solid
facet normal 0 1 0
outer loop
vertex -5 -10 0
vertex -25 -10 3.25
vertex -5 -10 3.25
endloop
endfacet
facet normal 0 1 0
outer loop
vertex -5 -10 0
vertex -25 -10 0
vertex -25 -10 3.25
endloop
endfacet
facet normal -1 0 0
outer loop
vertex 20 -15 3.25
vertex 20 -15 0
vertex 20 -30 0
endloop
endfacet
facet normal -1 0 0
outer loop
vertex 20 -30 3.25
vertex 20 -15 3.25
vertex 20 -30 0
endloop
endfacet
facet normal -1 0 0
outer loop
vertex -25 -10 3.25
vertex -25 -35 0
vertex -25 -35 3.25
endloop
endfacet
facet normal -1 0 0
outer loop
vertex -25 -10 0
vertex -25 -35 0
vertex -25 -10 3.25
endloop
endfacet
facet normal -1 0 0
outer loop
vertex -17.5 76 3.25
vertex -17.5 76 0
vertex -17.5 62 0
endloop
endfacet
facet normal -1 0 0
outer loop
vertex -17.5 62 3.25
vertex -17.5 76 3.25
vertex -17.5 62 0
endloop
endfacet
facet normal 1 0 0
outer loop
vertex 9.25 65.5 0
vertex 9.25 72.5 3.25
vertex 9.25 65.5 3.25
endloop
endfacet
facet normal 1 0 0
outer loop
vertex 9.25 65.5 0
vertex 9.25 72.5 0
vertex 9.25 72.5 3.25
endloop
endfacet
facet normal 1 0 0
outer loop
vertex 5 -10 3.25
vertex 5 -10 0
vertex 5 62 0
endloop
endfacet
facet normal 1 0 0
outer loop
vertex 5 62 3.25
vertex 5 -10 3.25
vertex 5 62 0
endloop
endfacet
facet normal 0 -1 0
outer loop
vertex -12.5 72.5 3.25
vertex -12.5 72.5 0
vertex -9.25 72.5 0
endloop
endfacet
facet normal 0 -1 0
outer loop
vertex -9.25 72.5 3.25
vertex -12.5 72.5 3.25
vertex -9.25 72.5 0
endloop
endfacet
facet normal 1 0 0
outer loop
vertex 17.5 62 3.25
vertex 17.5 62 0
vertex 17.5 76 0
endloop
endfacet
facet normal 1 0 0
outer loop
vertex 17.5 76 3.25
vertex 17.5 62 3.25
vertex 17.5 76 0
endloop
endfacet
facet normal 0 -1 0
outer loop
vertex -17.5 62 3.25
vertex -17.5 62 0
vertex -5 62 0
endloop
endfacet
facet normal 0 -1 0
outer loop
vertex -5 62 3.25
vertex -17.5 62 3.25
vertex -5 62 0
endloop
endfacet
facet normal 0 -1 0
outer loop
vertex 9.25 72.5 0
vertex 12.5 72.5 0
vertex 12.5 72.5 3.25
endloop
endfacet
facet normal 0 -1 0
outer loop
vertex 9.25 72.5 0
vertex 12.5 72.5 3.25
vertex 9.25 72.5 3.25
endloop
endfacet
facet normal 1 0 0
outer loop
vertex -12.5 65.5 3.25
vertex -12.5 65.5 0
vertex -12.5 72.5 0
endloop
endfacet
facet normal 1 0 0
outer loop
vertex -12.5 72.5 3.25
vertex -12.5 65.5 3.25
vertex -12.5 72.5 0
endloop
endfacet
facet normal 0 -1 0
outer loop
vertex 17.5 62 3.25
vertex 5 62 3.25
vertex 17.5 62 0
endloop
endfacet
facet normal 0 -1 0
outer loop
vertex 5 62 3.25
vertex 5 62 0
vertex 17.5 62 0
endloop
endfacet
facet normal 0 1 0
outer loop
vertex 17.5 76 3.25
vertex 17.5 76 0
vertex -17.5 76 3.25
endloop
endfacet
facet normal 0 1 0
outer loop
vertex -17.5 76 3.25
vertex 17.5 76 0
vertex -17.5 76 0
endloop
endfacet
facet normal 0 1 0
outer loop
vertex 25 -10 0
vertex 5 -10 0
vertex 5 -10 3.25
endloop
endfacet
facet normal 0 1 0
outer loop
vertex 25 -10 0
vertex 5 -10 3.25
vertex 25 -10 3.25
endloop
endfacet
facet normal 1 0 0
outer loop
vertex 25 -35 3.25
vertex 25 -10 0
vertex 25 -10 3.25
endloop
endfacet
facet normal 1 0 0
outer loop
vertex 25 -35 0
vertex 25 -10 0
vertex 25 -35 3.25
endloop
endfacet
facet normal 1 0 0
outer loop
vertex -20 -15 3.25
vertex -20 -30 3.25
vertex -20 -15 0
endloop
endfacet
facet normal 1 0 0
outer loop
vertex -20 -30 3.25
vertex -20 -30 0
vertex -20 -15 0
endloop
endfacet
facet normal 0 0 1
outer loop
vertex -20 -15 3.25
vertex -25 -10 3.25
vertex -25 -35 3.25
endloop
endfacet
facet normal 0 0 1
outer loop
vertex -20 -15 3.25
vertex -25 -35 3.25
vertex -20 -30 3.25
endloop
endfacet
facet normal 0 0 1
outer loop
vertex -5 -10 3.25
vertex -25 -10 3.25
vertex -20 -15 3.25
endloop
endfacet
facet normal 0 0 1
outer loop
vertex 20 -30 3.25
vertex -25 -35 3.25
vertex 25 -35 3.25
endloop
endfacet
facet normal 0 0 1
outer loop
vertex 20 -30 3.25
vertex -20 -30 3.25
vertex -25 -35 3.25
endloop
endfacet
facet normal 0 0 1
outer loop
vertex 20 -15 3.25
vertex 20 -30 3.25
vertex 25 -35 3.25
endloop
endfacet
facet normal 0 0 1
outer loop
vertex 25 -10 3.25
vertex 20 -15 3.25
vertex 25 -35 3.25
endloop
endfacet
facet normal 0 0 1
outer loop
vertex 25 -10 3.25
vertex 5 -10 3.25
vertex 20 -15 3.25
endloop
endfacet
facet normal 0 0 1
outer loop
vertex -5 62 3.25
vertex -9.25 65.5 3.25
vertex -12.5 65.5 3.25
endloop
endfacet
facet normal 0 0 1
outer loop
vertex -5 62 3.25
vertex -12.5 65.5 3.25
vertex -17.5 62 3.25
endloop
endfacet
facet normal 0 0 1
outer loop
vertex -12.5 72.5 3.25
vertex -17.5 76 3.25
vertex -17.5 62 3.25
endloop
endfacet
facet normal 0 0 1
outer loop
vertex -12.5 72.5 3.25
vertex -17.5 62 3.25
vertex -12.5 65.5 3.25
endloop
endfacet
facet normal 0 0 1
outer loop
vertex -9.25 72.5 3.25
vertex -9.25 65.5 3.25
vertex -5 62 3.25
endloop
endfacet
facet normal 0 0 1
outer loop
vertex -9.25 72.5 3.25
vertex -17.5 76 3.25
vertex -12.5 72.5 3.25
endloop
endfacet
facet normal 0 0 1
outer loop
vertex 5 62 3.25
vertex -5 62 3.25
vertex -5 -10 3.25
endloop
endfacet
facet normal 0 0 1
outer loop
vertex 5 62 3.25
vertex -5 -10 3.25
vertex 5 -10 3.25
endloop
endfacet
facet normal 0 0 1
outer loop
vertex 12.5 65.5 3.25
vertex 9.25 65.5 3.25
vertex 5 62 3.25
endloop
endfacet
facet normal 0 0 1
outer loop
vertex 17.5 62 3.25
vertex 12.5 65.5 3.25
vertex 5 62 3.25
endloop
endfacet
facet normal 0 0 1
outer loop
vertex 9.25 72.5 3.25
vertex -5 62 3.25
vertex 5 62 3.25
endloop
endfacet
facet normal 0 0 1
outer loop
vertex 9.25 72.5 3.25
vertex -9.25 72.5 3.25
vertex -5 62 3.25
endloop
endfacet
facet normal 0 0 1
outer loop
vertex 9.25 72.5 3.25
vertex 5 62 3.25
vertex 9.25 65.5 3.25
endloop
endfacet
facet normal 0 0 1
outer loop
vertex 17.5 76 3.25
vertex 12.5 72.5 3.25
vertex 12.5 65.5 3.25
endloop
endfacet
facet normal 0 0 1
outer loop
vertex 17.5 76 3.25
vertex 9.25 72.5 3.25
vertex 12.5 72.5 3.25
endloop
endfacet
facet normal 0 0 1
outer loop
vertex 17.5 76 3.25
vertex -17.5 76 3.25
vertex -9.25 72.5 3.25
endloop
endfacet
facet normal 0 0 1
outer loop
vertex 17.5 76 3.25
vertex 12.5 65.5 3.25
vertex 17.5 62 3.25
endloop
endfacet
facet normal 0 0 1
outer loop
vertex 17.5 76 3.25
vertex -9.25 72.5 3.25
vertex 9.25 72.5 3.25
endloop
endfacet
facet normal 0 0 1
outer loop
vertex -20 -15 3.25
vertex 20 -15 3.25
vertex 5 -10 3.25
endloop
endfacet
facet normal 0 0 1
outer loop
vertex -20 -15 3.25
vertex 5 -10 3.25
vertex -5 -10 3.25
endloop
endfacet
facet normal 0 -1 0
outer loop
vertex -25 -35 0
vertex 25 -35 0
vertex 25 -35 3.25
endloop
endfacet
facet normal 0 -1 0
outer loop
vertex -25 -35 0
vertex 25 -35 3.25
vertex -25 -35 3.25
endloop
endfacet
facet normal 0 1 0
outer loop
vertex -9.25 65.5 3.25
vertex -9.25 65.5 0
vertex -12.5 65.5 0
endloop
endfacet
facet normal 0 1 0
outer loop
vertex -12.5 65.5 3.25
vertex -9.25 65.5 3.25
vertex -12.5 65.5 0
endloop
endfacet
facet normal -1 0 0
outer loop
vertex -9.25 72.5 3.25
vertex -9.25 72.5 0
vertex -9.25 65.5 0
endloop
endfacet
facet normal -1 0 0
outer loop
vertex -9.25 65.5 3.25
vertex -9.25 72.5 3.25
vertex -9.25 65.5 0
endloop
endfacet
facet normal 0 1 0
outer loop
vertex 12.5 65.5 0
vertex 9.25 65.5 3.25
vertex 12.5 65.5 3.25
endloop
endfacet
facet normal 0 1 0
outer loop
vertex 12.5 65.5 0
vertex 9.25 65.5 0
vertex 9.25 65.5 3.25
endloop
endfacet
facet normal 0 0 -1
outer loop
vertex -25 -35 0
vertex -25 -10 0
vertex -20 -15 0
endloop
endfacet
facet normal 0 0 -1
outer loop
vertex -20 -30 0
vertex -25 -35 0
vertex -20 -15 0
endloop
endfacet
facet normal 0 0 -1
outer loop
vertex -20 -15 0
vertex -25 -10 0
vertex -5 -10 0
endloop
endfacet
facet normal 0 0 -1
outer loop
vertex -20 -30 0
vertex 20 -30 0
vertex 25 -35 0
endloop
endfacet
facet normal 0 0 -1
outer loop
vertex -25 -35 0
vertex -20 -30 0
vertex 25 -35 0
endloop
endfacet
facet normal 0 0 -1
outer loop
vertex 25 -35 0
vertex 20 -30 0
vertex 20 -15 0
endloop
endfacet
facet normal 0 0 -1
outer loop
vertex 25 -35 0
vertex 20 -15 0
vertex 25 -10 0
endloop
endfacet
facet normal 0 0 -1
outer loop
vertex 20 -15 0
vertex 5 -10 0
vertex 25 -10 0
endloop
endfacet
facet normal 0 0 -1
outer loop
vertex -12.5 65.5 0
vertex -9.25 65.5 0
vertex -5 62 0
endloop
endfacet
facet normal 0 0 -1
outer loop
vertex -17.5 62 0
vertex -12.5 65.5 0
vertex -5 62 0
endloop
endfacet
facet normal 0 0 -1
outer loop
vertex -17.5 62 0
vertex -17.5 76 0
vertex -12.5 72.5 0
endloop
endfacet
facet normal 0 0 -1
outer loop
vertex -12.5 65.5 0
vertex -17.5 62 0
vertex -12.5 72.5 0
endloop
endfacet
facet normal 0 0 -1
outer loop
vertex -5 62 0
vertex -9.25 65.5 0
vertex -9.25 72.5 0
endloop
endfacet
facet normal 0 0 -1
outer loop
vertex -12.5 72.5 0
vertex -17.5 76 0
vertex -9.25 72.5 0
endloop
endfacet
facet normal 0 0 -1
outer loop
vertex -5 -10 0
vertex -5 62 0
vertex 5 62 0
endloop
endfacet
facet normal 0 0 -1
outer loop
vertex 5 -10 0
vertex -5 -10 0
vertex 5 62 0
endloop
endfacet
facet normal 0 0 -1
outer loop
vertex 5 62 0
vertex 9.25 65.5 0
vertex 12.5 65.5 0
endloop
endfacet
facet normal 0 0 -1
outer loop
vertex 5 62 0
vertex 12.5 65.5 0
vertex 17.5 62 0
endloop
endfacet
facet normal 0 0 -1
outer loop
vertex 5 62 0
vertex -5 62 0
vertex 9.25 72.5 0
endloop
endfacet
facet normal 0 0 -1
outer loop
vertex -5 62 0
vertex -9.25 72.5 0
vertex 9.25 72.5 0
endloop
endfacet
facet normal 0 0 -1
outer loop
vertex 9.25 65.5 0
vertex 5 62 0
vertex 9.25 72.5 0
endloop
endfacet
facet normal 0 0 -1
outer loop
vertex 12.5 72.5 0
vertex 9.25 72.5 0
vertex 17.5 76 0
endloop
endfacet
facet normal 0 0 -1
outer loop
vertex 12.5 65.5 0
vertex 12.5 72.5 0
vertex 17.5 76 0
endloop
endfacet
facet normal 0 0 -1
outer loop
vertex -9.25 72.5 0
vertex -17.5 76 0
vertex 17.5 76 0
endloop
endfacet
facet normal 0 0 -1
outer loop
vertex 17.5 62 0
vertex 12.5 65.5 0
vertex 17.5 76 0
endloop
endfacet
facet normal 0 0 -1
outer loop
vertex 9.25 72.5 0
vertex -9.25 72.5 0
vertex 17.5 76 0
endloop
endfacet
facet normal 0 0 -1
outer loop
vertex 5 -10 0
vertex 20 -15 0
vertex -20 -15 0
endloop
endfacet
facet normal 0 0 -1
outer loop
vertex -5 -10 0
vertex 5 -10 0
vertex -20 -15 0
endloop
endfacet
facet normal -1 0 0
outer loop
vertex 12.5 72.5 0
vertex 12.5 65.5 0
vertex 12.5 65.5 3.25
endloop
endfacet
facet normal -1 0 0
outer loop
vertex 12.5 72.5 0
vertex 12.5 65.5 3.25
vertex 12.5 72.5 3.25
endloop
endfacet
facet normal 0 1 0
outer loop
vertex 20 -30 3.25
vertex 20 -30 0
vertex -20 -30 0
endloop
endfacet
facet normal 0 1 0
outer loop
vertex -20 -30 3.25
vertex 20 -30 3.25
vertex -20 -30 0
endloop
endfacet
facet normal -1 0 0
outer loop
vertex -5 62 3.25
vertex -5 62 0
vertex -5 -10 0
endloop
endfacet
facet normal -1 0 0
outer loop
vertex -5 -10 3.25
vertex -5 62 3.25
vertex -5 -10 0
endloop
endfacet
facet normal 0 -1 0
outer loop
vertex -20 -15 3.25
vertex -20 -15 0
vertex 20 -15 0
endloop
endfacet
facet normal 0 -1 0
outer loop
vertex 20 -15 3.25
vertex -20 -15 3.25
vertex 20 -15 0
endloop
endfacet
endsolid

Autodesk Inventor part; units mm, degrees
ref_plane "YZ Plane" through (0, 0, 0) normal (1, 0, 0) x (0, 1, 0)
ref_plane "XZ Plane" through (0, 0, 0) normal (0, 1, 0) x (-1, 0, 0)
ref_plane "XY Plane" through (0, 0, 0) normal (0, 0, 1) x (1, 0, 0)
sketch "Sketch1" plane through (0, 0, 0) normal (0, 0, 1) x (1, 0, 0)
  line L0 (-50, 50) -> (50, 50)
  line L1 (50, 50) -> (50, -50)
  line L2 (50, -50) -> (-50, -50)
  line L3 (-50, -50) -> (-50, 50)
  line L4 (-92.7646, -8.503) -> (-89.7646, -8.503)
  line L5 (-89.7646, -8.503) -> (-89.7646, -11.753)
  line L6 (-89.7646, -11.753) -> (-92.7646, -11.753)
  line L7 (-92.7646, -11.753) -> (-92.7646, -8.503)
  line L8 (-92.7646, -21.6527) -> (-89.7646, -21.6527)
  line L9 (-89.7646, -21.6527) -> (-89.7646, -21.7527)
  line L10 (-89.7646, -21.7527) -> (-92.7646, -21.7527)
  line L11 (-92.7646, -21.7527) -> (-92.7646, -21.6527)
  line L12 (-50, 50) -> (-46.75, 50)
  line L13 (-46.75, 50) -> (-46.75, 36)
  line L14 (-46.75, 36) -> (-50, 36)
  line L15 (-50, 36) -> (-50, 50)
  line L16 (0, 50) -> (0, -50) construction
  line L17 (-50, 0) -> (50, 0) construction
  line L18 (50, 50) -> (46.75, 50)
  line L19 (46.75, 50) -> (46.75, 36)
  line L20 (46.75, 36) -> (50, 36)
  line L21 (50, 36) -> (50, 50)
  line L22 (-50, -50) -> (-46.75, -50)
  line L23 (-46.75, -50) -> (-46.75, -36)
  line L24 (-46.75, -36) -> (-50, -36)
  line L25 (-50, -36) -> (-50, -50)
  line L26 (46.75, -50) -> (46.75, -36)
  line L27 (46.75, -36) -> (50, -36)
  line L28 (50, -36) -> (50, -50)
  line L29 (50, -50) -> (46.75, -50)
  line L30 (-40, 40) -> (-10, 40)
  line L31 (-10, 40) -> (-10, 0)
  line L32 (-10, 0) -> (-40, 0)
  line L33 (-40, 0) -> (-40, 40)
  line L34 (40, 40) -> (10, 40)
  line L35 (10, 40) -> (10, 0)
  line L36 (10, 0) -> (40, 0)
  line L37 (40, 0) -> (40, 40)
  line L38 (-10, 50) -> (-6.75, 50)
  line L39 (-6.75, 50) -> (-6.75, 42)
  line L40 (-6.75, 42) -> (-10, 42)
  line L41 (-10, 42) -> (-10, 50)
  line L42 (10, 50) -> (6.75, 50)
  line L43 (6.75, 50) -> (6.75, 42)
  line L44 (6.75, 42) -> (10, 42)
  line L45 (10, 42) -> (10, 50)
  line L46 (-25, 0) -> (-25, 40) construction
  line L47 (-40, 50) -> (-43.25, 50)
  line L48 (-43.25, 50) -> (-43.25, 42)
  line L49 (-43.25, 42) -> (-40, 42)
  line L50 (-40, 42) -> (-40, 50)
  line L51 (43.25, 42) -> (40, 42)
  line L52 (43.25, 50) -> (43.25, 42)
  line L53 (40, 50) -> (43.25, 50)
  line L54 (40, 42) -> (40, 50)
  line L55 (-20, -15) -> (20, -15)
  line L56 (20, -15) -> (20, -30)
  line L57 (20, -30) -> (-20, -30)
  line L58 (-20, -30) -> (-20, -15)
  line L59 (-25, -10) -> (25, -10)
  line L60 (25, -10) -> (25, -35)
  line L61 (25, -35) -> (-25, -35)
  line L62 (-25, -35) -> (-25, -10)
  line L63 (0, -15) -> (0, -30) construction
  line L64 (-5, -10) -> (5, -10)
  line L65 (5, -10) -> (5, 62)
  line L66 (5, 62) -> (-5, 62)
  line L67 (-5, 62) -> (-5, -10)
  line L68 (0, 62) -> (0, -10) construction
  line L69 (-17.5, 62) -> (17.5, 62)
  line L70 (17.5, 62) -> (17.5, 76)
  line L71 (17.5, 76) -> (-17.5, 76)
  line L72 (-17.5, 76) -> (-17.5, 62)
  line L73 (0, 76) -> (0, 62) construction
  line L74 (-20, -22.5) -> (20, -22.5) construction
  line L75 (-12.5, 72.5) -> (-9.25, 72.5)
  line L76 (-9.25, 72.5) -> (-9.25, 65.5)
  line L77 (-9.25, 65.5) -> (-12.5, 65.5)
  line L78 (-12.5, 65.5) -> (-12.5, 72.5)
  line L79 (-12.5, 69) -> (-9.25, 69) construction
  line L80 (12.5, 72.5) -> (9.25, 72.5)
  line L81 (9.25, 72.5) -> (9.25, 65.5)
  line L82 (9.25, 65.5) -> (12.5, 65.5)
  line L83 (12.5, 65.5) -> (12.5, 72.5)
  line L84 (12.5, 69) -> (9.25, 69) construction
  point P0 (0, 0)
  dimension "d0" = 100
  dimension "d2" = 100
  dimension "d3" = 3
  dimension "mat" = 3.25
  dimension "d5" = 3
  dimension "kerf" = 0.1
  dimension "d7" = 3.25
  dimension "d8" = 14
  dimension "d9" = 30
  dimension "d10" = 40
  dimension "d11" = 10
  dimension "d12" = 10
  dimension "d15" = 3.25
  dimension "d16" = 8
  dimension "d17" = 0
  dimension "d22" = 40
  dimension "d23" = 15
  dimension "d24" = 5
  dimension "d25" = 5
  dimension "d26" = 5
  dimension "d27" = 5
  dimension "d28" = 15
  dimension "d29" = 72
  dimension "d30" = 14
  dimension "d31" = 10
  dimension "d32" = 35
  dimension "d35" = 27.5
  dimension "d36" = 3.25
  dimension "d37" = 7
  dimension "d38" = 7
  dimension "d39" = 5
extrude "Extrusion4" add sketch "Sketch1" along normal blind 3.25 contours L67 L66 L65 L0 | L0 L65 L59 L67 | L69 L72 L71 L70 L66 | L59 L60 L61 L62 | L75 L76 L77 L78 | L83 L82 L81 L80
extrude "Extrusion5" cut sketch "Sketch1" along normal blind 3.25 contours L75 L76 L77 L78 | L83 L82 L81 L80
equation "\"d7\" = mat"
equation "\"d15\" = mat"
equation "\"d36\" = mat"
equation "\"d33\" = mat"
equation "\"d40\" = mat"
properties part number "body-back"
